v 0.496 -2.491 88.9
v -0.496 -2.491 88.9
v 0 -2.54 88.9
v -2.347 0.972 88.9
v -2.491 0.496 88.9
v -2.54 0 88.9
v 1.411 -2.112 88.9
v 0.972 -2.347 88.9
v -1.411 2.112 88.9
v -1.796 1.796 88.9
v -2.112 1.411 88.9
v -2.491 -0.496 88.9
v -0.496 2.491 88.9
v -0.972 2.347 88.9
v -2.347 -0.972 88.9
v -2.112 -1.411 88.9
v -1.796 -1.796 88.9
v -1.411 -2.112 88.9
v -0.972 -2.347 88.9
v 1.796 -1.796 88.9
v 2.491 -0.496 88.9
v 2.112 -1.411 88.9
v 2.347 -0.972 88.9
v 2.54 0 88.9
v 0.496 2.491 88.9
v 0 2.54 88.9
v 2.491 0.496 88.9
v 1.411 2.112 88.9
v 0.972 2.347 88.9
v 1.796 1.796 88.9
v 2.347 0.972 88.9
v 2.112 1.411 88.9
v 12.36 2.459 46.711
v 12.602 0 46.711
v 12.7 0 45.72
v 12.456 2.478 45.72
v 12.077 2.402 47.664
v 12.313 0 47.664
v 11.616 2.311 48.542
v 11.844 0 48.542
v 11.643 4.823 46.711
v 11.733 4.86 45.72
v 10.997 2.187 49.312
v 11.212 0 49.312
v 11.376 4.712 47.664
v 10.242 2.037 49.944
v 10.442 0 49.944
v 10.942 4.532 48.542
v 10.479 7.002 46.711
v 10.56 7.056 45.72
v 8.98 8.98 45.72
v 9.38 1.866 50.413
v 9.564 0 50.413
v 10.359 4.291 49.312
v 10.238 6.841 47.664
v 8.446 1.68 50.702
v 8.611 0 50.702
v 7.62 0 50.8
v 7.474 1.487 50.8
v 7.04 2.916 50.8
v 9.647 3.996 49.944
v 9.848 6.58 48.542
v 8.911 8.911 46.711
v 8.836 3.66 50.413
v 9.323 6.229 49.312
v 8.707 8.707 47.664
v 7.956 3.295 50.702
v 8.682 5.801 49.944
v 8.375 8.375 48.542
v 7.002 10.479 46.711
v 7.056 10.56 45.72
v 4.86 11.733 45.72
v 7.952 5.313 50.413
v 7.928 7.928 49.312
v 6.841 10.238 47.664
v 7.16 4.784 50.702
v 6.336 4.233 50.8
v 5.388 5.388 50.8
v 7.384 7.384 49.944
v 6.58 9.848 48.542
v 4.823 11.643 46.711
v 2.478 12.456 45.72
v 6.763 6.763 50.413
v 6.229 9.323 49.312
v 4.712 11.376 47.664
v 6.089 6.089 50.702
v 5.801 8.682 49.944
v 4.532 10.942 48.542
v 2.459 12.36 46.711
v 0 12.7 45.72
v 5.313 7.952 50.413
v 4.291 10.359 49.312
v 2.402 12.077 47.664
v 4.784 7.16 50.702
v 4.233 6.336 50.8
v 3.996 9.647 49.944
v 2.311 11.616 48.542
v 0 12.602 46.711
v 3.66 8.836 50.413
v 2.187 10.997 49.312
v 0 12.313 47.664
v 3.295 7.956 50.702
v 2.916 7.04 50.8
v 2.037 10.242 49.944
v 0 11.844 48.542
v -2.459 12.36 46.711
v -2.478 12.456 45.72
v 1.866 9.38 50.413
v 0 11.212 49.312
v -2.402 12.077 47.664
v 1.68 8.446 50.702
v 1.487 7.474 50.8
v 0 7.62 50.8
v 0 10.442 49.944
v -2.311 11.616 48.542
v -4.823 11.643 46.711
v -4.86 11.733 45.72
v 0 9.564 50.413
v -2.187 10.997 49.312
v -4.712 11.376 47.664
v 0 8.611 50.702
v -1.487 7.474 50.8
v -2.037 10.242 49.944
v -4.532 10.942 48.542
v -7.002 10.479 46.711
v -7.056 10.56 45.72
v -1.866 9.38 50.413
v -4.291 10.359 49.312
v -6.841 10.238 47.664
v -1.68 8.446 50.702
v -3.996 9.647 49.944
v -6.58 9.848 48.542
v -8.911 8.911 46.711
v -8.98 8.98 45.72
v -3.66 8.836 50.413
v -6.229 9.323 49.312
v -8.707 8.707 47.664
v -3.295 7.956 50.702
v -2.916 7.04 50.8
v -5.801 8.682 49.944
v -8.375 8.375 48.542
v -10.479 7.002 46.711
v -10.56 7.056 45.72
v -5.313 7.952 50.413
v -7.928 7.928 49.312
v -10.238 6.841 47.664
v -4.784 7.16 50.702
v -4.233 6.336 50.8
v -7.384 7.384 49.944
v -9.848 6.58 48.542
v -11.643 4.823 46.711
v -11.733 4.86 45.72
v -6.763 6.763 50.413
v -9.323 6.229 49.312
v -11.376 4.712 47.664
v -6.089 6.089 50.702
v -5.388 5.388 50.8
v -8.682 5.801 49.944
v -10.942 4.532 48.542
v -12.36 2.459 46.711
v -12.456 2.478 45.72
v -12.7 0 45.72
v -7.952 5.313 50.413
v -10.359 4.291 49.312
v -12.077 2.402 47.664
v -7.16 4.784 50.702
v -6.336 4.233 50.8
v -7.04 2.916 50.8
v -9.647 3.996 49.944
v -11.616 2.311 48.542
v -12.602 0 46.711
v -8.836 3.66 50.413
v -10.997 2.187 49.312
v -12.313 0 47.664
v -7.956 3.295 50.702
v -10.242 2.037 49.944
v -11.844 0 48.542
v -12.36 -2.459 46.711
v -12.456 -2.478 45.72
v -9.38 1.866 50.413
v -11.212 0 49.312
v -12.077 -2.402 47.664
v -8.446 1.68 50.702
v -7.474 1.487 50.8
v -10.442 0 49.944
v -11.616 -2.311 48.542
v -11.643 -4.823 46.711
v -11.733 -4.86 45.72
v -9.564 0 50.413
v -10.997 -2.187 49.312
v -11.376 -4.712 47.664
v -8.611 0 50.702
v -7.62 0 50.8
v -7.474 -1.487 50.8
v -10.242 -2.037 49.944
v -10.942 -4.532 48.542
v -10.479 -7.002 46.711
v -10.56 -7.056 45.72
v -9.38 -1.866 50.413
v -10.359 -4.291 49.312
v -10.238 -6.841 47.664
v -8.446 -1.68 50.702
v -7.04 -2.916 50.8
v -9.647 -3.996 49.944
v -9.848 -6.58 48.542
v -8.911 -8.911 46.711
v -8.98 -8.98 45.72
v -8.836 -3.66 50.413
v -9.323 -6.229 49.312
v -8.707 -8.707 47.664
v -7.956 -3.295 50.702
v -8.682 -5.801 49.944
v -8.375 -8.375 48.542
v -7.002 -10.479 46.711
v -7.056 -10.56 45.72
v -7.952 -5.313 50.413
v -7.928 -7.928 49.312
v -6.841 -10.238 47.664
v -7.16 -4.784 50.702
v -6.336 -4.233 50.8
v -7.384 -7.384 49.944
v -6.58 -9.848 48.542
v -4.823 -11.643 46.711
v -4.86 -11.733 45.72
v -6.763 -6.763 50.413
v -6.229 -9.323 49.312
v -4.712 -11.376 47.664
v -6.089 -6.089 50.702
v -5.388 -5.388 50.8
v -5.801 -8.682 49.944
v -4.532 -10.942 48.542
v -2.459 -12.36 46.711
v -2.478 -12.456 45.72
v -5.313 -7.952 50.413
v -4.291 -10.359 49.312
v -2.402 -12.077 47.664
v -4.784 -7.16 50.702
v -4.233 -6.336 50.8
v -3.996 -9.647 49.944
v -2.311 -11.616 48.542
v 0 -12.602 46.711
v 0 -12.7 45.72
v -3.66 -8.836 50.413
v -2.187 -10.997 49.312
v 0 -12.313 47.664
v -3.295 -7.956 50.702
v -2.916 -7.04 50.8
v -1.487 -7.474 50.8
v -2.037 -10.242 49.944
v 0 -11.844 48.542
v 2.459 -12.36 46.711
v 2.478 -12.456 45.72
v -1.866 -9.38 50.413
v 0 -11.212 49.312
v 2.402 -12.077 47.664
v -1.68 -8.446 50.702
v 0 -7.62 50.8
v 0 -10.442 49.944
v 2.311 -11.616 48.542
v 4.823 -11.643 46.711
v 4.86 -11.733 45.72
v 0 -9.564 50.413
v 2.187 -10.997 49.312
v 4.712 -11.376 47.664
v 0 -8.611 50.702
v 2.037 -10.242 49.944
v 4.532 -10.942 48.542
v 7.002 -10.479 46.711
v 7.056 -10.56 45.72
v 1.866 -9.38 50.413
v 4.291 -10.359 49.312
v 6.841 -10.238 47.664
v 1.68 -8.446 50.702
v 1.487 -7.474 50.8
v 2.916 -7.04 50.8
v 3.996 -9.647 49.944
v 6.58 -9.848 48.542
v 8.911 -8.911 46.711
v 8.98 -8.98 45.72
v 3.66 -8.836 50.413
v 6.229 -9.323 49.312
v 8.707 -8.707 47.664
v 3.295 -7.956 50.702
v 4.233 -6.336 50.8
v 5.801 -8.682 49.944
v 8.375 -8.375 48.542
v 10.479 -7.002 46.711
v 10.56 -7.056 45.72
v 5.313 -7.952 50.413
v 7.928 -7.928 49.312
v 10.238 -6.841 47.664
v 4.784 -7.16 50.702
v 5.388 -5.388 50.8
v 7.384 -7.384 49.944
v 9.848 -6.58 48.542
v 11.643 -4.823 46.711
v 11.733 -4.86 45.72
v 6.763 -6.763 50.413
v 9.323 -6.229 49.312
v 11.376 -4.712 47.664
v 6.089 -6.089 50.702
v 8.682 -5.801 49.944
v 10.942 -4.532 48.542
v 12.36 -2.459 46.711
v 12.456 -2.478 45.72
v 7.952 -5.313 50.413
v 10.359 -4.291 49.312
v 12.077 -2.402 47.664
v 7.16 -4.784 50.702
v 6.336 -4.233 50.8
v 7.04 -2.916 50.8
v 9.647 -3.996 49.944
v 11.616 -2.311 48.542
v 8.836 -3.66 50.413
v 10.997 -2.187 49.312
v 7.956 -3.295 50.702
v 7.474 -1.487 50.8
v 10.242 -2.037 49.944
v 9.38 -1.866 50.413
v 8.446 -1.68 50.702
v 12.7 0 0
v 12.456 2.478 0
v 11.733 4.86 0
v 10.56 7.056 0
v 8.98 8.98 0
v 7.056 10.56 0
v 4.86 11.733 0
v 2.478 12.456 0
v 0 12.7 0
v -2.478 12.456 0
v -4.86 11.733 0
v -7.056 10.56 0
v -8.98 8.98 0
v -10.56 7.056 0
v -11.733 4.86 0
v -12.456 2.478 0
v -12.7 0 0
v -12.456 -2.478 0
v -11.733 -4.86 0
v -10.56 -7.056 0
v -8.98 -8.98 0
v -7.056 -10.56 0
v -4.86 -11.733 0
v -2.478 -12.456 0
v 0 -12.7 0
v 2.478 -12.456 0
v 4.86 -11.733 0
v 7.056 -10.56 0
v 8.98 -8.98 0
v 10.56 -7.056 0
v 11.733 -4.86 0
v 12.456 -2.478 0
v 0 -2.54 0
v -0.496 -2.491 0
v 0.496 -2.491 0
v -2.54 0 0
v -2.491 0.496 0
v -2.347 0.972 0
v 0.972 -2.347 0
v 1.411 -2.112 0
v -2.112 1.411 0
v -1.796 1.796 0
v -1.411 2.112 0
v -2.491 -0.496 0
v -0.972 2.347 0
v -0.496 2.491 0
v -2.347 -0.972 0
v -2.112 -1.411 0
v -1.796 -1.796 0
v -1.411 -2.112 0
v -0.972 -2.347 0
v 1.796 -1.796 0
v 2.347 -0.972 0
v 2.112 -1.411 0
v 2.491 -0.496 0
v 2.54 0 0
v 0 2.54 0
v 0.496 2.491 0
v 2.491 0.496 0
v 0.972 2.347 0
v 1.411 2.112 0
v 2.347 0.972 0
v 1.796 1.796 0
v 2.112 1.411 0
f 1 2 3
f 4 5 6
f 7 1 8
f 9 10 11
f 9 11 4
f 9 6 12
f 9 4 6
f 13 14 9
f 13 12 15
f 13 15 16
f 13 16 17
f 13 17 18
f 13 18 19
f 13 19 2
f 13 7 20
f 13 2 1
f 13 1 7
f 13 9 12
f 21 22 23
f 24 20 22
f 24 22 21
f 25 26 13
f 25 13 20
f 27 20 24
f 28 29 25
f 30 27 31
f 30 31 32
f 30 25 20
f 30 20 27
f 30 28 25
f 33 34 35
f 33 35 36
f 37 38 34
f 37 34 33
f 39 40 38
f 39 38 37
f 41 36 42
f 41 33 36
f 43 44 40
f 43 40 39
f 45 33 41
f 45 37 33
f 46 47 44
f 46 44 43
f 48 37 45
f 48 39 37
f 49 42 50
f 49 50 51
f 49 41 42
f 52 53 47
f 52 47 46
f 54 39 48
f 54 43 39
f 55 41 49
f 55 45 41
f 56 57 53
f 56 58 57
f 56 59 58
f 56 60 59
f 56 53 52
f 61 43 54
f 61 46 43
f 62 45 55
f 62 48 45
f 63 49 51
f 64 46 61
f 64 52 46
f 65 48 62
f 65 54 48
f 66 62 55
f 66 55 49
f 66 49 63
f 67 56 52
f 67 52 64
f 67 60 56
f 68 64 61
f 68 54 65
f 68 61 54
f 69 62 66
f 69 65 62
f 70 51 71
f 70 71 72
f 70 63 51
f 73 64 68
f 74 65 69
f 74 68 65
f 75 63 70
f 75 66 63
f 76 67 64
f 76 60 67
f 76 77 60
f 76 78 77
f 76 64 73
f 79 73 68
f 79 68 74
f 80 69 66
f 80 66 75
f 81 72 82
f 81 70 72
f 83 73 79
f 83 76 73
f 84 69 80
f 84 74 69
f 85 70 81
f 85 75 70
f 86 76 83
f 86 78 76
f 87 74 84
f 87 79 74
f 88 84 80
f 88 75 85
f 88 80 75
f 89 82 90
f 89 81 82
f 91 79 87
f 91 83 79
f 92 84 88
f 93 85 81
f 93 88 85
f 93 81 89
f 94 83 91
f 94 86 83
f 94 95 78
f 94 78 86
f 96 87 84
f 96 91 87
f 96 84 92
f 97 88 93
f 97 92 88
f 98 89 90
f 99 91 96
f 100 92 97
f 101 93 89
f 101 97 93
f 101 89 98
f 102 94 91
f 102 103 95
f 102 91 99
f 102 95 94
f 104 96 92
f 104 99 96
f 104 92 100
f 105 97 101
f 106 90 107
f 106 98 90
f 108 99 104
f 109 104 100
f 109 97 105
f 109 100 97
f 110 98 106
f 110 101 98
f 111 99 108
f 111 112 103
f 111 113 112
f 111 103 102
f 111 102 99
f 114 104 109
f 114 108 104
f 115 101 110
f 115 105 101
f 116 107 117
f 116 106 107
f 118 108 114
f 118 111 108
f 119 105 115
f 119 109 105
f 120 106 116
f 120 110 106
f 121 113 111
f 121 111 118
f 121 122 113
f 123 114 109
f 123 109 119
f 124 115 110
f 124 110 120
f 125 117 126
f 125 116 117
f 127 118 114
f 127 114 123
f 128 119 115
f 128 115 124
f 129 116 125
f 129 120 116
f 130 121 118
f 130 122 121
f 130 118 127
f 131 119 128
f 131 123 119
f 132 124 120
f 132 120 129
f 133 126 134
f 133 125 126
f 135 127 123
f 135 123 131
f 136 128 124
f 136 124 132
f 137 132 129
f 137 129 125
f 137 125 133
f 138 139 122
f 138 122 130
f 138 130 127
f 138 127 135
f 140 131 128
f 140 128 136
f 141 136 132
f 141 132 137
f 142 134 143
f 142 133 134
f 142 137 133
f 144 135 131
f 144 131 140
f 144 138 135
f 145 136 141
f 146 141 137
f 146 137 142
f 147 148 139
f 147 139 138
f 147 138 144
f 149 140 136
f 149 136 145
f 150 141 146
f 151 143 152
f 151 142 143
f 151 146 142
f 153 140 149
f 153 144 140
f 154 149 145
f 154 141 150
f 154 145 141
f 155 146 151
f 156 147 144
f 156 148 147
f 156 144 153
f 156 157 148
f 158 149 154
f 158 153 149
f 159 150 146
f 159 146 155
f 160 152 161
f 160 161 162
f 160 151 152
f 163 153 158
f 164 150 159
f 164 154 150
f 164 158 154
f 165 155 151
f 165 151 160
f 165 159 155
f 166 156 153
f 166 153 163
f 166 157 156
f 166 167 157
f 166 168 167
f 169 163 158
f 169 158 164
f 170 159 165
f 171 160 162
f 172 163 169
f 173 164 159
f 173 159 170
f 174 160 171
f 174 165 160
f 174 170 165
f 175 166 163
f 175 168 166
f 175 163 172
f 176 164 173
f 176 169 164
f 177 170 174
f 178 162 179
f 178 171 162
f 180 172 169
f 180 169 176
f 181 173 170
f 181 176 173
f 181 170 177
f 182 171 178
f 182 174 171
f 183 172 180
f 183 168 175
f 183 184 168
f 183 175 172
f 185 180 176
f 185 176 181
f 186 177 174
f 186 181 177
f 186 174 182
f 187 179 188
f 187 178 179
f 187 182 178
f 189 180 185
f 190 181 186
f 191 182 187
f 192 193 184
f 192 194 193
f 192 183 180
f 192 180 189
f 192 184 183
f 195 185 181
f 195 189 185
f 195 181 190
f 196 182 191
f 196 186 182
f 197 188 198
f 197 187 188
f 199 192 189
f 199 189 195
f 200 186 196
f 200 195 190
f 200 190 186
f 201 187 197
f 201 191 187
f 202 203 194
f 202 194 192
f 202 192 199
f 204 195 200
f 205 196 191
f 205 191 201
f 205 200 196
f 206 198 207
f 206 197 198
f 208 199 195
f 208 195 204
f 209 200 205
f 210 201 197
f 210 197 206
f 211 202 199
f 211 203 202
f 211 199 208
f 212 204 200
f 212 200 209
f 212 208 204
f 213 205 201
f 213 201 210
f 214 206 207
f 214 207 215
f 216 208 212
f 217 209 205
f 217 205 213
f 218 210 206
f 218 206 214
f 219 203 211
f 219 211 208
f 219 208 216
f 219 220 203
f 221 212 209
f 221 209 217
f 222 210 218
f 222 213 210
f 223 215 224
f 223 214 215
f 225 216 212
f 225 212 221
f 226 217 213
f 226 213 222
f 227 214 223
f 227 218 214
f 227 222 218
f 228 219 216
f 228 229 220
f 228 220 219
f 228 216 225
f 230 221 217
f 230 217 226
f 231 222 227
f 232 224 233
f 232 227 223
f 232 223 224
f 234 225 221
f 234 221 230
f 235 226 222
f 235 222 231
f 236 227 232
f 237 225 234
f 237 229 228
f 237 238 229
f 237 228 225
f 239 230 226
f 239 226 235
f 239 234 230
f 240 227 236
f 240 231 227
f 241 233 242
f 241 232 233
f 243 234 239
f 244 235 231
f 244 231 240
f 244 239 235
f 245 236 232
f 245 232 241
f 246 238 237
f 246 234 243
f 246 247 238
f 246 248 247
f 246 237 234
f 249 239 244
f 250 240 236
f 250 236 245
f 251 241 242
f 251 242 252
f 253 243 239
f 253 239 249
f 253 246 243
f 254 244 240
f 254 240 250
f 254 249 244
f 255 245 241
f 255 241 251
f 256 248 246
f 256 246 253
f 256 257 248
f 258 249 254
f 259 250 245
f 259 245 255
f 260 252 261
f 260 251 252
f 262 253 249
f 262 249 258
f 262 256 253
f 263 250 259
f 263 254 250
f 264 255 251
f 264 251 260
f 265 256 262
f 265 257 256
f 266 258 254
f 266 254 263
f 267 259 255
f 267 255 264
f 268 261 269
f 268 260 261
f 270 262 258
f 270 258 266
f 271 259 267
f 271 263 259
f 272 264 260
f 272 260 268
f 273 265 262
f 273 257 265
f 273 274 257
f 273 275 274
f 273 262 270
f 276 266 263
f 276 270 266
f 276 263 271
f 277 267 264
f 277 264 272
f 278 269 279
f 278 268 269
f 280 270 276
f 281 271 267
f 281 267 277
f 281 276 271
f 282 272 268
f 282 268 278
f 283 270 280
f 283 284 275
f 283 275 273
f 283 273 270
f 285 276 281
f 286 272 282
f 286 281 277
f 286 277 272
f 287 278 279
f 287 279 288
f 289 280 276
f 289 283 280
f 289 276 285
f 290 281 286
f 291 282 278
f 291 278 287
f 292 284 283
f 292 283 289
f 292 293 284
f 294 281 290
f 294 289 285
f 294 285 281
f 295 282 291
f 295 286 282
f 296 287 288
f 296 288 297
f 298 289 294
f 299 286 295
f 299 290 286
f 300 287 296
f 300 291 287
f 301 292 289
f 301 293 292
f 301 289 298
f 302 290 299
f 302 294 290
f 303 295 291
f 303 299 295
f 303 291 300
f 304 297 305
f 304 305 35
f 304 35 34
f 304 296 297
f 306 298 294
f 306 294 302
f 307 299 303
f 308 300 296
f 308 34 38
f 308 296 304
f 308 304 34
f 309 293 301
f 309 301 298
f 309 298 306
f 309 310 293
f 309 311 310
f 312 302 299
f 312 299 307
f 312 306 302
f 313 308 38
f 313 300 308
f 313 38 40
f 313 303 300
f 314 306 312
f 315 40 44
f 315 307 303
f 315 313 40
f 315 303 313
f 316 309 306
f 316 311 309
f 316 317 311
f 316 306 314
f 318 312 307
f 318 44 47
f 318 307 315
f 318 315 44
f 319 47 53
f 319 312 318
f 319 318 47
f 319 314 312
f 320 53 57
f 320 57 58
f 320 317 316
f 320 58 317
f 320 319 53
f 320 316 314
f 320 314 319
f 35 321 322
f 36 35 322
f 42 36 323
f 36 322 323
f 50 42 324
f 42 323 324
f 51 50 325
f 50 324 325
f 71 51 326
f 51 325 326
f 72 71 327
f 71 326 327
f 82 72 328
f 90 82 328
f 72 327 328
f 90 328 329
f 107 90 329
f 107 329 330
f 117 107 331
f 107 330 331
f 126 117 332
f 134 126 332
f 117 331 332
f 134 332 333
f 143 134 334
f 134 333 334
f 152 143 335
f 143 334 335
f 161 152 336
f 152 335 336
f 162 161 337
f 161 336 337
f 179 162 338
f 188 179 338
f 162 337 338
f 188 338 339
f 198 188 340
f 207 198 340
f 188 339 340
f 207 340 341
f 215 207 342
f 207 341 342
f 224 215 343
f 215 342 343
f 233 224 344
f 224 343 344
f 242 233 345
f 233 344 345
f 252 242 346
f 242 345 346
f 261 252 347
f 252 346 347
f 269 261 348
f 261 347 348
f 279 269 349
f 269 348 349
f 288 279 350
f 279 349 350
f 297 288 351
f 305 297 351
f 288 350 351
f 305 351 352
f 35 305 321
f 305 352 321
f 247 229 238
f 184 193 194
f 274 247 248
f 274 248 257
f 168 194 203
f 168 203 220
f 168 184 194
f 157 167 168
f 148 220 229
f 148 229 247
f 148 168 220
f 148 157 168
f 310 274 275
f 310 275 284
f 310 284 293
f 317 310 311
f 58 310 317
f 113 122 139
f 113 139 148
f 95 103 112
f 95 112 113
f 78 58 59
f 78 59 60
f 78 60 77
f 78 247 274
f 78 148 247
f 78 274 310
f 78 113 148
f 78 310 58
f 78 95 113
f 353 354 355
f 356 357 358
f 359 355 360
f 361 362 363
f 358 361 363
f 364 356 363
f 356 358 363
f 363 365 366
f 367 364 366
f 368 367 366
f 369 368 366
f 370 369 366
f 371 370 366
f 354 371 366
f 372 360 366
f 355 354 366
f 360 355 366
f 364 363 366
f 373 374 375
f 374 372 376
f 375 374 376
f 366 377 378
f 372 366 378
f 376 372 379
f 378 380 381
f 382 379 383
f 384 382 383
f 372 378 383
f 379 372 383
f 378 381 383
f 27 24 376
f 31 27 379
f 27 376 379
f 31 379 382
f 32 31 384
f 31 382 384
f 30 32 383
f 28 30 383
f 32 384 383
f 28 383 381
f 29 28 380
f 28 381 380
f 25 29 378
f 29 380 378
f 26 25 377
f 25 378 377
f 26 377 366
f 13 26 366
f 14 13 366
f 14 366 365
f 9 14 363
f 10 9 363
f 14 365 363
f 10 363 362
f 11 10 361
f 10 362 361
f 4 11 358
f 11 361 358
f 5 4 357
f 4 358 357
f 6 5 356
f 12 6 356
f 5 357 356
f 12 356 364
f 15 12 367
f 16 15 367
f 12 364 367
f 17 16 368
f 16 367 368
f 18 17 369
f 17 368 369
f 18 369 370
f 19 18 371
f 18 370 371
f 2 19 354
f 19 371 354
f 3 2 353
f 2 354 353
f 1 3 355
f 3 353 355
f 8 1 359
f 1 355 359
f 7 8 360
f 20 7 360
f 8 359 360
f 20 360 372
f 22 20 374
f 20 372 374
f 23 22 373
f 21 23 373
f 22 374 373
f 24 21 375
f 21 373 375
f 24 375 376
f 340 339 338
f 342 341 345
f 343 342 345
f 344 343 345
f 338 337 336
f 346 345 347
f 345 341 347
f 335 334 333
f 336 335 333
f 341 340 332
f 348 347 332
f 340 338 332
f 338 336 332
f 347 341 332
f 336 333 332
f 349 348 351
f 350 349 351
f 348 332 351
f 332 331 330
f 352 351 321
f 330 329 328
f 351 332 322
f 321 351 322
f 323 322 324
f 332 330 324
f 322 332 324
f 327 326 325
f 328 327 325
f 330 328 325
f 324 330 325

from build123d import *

# Parameters (mm, degrees)
F0_R     = 12.7
F1_DEPTH = 50.8
F2_R     = 2.54
F3_DEPTH = 88.9
F4_R     = 5.08


with BuildPart() as f1:
    # F0 (on Top) → F1 (new body)
    with BuildSketch(Plane.XY):
        Circle(F0_R)
    extrude(amount=F1_DEPTH)

    # F4
    f4_edges = [f1.edges().sort_by_distance(p)[0] for p in [
        (-12.7, 0, 50.8),
    ]]
    fillet(f4_edges, radius=F4_R)


with BuildPart() as f3:
    # F2 (on Top) → F3 (new body)
    with BuildSketch(Plane.XY):
        Circle(F2_R)
    extrude(amount=F3_DEPTH)


solid = Compound([f1.part, f3.part])
